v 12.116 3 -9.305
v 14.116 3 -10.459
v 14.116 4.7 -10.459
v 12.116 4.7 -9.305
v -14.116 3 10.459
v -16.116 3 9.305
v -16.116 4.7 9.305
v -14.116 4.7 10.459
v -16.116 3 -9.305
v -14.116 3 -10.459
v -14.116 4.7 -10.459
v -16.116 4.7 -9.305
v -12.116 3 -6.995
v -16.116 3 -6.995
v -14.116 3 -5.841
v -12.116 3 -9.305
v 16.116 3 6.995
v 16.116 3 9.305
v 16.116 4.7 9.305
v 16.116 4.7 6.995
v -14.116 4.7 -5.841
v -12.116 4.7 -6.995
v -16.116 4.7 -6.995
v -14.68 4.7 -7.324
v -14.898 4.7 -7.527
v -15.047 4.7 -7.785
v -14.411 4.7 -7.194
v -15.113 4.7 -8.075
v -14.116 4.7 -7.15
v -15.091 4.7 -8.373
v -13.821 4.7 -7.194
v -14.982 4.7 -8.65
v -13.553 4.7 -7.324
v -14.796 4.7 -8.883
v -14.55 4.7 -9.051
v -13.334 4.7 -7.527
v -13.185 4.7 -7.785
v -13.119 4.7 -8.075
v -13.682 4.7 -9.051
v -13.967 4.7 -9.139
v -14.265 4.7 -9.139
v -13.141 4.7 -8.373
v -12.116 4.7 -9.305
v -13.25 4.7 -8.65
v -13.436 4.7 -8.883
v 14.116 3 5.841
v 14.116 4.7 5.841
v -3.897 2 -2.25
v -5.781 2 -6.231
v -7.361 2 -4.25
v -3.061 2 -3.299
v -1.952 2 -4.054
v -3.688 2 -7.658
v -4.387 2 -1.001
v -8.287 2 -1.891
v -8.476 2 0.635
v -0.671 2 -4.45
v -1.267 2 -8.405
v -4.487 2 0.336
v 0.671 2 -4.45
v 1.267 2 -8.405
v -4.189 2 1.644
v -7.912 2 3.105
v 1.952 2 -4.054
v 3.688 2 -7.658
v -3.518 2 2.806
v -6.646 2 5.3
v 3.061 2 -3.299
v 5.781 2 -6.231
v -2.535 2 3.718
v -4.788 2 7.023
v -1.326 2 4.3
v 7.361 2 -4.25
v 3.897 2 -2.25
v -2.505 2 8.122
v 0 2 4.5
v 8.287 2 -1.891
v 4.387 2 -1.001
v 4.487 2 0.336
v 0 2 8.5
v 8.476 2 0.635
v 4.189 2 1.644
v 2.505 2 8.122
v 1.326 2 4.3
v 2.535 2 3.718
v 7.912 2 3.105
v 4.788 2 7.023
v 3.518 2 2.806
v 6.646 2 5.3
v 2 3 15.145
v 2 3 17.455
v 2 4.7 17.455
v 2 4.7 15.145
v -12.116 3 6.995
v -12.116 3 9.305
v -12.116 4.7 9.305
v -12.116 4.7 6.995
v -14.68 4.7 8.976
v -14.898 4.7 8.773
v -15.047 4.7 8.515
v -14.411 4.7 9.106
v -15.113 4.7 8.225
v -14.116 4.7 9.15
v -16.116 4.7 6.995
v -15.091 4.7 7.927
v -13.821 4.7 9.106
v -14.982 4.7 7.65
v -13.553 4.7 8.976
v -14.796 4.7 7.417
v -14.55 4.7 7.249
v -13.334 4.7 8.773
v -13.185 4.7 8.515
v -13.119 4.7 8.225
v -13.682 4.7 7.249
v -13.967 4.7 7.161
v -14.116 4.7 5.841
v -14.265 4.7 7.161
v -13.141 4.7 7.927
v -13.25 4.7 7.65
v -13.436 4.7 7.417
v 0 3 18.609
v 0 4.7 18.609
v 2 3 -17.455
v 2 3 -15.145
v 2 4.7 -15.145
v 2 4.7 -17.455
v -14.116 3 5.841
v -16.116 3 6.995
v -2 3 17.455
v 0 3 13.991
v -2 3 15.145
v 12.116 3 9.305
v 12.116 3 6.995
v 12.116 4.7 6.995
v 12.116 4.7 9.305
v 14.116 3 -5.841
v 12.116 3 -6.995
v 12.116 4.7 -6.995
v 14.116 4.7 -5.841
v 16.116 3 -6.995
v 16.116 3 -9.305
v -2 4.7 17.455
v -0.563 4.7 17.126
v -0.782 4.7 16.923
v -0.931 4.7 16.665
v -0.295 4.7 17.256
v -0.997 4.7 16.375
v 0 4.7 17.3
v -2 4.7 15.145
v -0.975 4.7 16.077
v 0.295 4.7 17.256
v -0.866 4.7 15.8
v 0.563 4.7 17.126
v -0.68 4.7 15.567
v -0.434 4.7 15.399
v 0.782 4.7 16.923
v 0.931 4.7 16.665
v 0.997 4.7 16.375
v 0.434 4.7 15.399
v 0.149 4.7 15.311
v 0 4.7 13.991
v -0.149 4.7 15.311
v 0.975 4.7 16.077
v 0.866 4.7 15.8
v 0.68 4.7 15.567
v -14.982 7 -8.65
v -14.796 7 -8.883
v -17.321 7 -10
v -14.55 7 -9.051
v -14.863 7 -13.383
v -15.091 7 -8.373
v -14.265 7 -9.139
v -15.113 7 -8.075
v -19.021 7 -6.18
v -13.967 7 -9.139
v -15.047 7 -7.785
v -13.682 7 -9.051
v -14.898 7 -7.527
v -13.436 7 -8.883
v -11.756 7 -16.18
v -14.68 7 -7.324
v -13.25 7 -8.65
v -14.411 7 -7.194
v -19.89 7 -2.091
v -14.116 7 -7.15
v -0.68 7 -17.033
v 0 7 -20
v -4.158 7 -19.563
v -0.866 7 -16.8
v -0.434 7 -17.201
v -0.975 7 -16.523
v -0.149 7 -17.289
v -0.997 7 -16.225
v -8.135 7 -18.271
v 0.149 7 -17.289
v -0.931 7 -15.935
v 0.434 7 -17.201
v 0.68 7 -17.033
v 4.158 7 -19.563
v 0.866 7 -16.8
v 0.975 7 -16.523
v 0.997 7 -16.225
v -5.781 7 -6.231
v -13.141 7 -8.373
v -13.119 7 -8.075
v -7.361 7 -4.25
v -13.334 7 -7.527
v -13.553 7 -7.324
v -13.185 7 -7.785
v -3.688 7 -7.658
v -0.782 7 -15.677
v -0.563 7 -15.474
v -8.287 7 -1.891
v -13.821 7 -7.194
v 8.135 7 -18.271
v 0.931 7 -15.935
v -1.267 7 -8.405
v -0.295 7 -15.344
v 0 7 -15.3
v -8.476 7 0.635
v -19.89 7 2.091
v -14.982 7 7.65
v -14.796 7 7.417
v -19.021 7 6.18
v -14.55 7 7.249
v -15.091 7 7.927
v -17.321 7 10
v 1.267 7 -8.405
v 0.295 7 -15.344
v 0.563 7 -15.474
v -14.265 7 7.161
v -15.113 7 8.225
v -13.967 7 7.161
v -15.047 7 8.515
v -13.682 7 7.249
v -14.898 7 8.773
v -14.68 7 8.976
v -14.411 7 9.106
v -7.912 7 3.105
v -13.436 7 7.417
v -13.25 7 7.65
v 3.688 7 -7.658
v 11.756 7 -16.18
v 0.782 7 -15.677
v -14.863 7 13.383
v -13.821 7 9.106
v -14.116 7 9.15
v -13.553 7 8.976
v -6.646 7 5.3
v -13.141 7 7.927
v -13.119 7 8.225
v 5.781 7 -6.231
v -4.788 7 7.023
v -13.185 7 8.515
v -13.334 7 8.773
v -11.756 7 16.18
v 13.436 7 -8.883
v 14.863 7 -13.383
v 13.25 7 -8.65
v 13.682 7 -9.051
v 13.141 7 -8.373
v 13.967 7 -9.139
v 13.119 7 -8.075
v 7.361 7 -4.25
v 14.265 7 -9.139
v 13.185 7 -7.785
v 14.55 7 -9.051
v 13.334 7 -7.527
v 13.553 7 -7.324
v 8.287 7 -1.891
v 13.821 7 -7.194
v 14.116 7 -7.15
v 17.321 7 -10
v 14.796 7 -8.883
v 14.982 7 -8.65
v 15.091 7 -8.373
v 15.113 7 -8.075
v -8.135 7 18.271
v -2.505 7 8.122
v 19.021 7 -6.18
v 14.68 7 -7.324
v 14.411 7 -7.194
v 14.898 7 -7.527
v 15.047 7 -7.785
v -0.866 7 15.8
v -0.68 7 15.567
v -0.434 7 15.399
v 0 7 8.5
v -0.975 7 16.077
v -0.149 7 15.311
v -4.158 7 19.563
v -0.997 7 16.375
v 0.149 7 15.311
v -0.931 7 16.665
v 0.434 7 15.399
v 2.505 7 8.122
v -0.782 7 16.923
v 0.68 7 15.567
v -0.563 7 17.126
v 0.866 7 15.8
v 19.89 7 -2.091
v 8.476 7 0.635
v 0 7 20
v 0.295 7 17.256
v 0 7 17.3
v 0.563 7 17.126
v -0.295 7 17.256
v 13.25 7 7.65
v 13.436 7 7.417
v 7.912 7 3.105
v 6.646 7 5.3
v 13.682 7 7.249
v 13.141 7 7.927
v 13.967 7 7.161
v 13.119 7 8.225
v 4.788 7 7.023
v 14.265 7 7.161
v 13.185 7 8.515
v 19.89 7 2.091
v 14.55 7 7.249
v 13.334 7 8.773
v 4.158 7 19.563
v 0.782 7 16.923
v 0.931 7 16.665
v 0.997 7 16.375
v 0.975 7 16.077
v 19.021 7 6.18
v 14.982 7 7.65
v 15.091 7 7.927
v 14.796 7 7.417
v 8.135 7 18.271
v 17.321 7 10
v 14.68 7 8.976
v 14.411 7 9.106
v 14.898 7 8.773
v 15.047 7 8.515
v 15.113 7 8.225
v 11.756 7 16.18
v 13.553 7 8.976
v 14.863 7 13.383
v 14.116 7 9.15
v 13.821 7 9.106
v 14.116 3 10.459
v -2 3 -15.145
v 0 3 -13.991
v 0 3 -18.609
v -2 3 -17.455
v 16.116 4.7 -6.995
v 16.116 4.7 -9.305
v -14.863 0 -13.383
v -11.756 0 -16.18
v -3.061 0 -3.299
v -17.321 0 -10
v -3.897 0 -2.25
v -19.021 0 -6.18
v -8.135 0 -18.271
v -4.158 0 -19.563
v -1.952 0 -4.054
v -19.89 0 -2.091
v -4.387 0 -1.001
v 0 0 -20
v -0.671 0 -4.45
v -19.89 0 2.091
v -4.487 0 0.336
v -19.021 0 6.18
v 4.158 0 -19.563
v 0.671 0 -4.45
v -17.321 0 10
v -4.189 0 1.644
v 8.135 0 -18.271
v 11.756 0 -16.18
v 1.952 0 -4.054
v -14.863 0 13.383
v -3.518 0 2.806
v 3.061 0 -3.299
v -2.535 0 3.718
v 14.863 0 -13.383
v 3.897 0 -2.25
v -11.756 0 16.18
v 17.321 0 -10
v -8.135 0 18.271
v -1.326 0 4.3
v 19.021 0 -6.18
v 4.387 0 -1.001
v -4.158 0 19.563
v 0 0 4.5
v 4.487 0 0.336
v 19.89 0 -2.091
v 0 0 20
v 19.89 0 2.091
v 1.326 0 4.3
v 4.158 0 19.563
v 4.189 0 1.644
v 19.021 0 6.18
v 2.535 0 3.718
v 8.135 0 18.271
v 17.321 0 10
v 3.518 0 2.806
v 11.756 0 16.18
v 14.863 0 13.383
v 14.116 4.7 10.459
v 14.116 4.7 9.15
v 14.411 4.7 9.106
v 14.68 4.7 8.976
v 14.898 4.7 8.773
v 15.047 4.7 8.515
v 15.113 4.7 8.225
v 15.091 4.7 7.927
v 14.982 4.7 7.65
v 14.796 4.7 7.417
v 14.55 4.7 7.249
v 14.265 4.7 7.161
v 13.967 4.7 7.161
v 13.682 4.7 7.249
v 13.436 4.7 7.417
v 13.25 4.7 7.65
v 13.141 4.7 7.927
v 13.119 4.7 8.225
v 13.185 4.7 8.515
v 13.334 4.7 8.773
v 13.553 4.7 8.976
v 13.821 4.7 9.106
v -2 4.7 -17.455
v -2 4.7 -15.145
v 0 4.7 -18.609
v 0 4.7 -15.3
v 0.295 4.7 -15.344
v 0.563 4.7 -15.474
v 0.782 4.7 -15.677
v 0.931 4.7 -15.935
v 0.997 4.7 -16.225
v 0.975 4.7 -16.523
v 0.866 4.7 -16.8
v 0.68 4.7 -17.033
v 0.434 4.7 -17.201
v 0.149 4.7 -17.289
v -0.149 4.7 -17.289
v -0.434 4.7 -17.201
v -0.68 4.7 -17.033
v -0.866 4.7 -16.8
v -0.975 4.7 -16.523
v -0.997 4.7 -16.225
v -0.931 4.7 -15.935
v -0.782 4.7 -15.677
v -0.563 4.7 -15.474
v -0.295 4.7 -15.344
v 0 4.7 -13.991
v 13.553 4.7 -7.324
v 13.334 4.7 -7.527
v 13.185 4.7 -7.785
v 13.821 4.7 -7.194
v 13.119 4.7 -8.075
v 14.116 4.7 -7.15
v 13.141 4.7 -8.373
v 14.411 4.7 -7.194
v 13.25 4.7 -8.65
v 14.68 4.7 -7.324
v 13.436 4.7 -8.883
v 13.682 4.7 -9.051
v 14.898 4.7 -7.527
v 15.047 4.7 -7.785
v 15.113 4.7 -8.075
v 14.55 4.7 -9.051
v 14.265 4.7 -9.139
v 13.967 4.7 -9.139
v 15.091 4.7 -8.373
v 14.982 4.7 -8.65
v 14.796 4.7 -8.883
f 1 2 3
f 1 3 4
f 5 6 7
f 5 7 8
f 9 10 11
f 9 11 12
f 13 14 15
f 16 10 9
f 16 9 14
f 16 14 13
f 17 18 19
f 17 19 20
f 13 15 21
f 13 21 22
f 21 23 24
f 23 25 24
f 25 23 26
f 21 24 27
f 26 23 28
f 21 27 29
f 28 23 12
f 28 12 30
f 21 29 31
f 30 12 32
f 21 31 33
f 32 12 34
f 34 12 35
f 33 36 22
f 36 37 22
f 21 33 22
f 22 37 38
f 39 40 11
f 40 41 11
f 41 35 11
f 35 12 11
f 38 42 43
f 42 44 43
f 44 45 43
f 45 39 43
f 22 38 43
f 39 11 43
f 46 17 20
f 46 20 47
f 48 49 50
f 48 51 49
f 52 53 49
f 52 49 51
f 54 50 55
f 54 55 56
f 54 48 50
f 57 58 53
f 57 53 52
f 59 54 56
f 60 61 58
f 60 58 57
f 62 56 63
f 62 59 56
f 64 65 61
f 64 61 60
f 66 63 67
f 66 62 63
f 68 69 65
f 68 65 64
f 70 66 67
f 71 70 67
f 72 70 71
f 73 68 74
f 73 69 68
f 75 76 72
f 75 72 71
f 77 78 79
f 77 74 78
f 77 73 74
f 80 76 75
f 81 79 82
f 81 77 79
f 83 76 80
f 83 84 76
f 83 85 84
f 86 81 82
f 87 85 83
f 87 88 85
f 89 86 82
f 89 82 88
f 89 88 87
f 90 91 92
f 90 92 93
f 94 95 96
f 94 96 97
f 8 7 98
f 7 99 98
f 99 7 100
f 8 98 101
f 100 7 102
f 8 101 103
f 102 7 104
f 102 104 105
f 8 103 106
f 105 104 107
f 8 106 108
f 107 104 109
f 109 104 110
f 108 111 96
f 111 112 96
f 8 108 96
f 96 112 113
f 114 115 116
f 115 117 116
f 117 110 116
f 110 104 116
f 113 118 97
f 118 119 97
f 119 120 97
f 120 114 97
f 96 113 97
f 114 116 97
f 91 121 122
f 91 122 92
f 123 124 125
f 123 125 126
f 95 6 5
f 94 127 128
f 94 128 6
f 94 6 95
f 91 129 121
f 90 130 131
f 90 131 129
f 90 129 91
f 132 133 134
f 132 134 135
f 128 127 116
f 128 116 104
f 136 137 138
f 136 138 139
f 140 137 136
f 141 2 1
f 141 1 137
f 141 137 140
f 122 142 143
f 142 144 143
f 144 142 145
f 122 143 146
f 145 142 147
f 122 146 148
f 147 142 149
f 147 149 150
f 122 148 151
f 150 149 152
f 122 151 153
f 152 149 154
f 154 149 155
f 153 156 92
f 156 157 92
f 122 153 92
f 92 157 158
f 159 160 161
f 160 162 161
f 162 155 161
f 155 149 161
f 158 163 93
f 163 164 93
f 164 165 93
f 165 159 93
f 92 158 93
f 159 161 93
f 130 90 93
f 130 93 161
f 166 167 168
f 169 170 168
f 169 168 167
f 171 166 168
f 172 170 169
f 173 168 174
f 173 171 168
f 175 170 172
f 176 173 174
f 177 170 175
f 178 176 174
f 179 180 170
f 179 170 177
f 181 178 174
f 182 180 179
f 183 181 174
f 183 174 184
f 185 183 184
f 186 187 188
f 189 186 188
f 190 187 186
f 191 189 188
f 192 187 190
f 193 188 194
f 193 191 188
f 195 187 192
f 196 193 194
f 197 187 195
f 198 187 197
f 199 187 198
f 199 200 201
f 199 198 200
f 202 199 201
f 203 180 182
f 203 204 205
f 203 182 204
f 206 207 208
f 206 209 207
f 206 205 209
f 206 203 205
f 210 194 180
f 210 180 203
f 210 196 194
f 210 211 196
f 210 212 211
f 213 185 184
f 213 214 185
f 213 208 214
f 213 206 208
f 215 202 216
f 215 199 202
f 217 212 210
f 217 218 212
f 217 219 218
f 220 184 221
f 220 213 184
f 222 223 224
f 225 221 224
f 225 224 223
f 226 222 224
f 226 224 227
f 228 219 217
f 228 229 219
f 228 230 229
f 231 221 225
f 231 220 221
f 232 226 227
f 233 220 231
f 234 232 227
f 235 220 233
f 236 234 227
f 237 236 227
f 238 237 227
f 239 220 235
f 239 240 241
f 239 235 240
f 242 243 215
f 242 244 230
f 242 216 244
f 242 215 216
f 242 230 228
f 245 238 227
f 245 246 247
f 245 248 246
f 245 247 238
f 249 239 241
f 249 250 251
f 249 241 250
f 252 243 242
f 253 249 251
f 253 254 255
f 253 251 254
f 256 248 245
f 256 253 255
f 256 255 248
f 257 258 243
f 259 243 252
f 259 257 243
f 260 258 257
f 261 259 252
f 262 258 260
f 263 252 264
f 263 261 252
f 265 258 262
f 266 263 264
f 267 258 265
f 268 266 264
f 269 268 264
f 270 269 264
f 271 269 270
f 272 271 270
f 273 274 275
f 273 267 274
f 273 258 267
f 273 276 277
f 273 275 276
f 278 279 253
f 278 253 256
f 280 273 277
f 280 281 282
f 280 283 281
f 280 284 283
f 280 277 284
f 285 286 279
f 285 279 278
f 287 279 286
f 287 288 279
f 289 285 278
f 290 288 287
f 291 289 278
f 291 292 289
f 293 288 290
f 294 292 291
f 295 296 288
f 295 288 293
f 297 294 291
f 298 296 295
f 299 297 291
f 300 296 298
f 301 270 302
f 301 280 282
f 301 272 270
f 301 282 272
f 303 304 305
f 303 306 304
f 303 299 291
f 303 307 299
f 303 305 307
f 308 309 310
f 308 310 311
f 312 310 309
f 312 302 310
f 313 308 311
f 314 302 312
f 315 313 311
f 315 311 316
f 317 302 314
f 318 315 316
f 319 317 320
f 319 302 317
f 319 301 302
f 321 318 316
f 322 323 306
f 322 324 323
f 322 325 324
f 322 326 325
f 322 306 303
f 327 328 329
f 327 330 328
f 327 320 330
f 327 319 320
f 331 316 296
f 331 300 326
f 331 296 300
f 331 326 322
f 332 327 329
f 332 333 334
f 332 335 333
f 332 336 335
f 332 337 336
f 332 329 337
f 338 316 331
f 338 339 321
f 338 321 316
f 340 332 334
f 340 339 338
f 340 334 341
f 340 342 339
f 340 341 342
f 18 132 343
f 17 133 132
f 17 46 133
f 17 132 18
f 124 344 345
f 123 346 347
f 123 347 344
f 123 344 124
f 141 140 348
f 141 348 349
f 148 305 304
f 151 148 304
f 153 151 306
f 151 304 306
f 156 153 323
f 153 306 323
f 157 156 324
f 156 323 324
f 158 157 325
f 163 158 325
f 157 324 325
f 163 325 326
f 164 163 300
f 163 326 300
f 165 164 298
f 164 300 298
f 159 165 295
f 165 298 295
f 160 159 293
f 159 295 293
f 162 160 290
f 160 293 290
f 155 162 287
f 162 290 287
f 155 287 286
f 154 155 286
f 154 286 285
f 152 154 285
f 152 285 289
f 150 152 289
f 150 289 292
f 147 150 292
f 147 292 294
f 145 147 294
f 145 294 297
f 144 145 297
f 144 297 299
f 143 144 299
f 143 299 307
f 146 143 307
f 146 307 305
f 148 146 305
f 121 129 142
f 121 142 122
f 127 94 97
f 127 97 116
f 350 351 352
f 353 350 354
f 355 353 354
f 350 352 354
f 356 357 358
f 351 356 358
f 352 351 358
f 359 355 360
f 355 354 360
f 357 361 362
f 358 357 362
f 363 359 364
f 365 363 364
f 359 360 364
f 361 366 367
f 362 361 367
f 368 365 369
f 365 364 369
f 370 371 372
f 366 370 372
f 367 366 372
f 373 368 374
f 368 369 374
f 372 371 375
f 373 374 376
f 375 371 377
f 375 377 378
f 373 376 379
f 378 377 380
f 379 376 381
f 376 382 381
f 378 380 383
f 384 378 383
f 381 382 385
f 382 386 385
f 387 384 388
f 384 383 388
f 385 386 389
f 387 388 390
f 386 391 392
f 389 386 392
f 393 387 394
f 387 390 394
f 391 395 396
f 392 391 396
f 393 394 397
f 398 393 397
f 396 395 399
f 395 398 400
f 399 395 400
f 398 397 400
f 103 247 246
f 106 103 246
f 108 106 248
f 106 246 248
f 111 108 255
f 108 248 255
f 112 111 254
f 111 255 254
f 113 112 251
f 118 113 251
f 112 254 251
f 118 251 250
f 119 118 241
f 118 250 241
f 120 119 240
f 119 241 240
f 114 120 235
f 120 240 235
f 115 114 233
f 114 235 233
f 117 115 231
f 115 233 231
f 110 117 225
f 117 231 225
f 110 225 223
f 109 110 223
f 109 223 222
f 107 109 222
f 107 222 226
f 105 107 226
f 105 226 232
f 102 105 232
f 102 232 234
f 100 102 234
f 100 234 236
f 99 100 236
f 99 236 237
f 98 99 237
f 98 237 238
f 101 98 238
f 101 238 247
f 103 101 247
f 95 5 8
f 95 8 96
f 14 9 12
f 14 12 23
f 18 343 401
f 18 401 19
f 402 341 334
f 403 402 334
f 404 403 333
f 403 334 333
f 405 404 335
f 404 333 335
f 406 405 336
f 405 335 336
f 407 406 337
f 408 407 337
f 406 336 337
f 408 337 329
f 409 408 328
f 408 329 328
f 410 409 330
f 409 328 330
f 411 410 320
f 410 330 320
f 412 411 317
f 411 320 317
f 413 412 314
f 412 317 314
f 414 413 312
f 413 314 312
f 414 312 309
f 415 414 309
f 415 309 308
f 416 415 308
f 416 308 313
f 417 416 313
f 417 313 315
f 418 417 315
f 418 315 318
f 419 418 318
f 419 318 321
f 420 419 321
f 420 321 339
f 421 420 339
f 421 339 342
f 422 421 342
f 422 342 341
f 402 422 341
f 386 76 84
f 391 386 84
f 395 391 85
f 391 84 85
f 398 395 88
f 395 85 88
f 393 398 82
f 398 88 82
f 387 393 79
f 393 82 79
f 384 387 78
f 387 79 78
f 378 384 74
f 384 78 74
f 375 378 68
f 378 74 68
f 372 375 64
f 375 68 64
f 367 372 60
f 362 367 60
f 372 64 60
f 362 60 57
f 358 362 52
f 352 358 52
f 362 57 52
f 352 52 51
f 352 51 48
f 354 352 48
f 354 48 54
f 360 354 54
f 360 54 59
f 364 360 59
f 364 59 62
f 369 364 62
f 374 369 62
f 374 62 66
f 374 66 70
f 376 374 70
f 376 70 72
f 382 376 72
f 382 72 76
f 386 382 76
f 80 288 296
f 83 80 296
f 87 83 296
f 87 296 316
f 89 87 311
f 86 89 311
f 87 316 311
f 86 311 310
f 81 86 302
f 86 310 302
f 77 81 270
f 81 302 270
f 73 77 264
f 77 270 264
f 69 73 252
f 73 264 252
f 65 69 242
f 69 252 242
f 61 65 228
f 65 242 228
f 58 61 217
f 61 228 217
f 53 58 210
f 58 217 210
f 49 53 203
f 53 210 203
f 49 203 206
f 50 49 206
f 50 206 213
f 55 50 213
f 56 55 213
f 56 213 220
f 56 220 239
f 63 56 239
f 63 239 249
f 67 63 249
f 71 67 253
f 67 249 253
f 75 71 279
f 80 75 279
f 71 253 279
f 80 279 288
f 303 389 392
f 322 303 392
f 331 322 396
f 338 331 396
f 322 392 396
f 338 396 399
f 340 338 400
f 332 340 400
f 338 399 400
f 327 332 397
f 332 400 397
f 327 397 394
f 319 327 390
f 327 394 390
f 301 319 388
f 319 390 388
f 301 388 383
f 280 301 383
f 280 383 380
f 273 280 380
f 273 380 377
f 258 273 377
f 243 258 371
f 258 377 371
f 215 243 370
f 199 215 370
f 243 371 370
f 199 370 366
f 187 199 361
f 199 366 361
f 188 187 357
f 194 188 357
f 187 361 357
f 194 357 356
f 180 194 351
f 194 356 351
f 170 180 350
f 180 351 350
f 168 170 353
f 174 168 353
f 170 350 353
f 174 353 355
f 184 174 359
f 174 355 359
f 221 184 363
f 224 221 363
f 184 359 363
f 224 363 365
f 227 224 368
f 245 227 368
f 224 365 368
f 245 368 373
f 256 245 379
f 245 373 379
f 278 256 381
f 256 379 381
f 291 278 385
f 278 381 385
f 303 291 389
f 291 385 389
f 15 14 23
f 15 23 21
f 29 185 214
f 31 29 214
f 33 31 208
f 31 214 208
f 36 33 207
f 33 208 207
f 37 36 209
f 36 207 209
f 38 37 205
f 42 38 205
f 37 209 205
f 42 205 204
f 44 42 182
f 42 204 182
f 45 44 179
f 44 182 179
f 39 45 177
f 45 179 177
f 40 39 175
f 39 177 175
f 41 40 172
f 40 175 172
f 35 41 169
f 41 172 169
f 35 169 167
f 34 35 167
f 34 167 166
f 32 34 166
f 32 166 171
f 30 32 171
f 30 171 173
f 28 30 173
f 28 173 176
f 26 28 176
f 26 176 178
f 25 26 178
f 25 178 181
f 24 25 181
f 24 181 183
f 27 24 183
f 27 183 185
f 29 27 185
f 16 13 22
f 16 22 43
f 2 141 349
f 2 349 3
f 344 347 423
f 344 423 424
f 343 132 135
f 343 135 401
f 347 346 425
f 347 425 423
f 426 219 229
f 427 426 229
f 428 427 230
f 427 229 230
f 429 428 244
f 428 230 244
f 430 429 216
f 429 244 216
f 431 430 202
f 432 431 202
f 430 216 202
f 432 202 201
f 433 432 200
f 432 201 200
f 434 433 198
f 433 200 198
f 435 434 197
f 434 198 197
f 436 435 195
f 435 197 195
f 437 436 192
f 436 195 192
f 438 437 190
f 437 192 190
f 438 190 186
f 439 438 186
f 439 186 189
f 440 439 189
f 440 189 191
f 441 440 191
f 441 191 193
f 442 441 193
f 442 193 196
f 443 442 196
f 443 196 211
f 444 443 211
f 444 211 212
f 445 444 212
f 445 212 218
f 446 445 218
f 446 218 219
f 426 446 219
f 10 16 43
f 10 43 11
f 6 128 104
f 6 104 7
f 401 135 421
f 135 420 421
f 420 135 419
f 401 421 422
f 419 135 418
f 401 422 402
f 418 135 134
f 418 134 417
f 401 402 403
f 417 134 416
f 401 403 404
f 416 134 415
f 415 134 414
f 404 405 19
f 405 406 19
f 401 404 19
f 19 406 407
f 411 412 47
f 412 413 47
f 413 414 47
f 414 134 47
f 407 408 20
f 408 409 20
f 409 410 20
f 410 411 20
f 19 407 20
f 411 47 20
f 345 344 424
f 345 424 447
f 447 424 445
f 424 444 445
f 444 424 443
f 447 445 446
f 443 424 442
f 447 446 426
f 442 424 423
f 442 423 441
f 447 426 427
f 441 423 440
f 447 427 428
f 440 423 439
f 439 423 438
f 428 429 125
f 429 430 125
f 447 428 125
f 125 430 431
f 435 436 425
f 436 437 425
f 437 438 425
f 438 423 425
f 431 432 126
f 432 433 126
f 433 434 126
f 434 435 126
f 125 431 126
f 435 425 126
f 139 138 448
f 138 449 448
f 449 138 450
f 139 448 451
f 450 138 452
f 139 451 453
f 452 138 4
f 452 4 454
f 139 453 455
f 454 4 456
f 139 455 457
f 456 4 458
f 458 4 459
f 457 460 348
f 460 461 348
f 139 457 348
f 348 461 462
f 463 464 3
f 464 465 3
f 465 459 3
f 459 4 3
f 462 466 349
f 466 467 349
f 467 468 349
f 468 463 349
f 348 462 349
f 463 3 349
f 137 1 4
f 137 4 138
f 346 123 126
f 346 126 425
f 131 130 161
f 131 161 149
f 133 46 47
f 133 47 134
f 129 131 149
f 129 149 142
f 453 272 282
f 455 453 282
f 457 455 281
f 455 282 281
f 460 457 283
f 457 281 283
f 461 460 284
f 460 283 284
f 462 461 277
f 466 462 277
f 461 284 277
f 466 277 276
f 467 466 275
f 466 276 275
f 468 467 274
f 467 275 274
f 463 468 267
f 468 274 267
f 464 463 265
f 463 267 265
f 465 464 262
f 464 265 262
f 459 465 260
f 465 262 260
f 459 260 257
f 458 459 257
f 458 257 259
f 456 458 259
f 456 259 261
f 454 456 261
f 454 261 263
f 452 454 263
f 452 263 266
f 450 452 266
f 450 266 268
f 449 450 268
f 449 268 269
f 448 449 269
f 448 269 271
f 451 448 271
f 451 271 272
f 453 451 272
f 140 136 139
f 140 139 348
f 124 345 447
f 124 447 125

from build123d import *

# Parameters (mm, degrees)
SKETCH1_R           = 20
BOSS_EXTRUDE1_DEPTH = 7
SKETCH2_R           = 8.5
CUT_EXTRUDE1_DEPTH  = 5
SKETCH3_R           = 4.5
CUT_EXTRUDE2_DEPTH  = 30.137604569
SKETCH4_R           = 1
CUT_EXTRUDE3_DEPTH  = 4
CUT_EXTRUDE4_DEPTH  = 1.7


with BuildPart() as part:
    # Sketch1 → Boss-Extrude1 (new body)
    with BuildSketch(Plane(origin=(0, 0, 0), x_dir=(1, 0, 0), z_dir=(0, 1, 0))):
        with Locations(Location((0, 0, 0), (0, 0, 270))):
            Circle(SKETCH1_R)
    extrude(amount=BOSS_EXTRUDE1_DEPTH)

    # Sketch2 → Cut-Extrude1 (cut)
    with BuildSketch(Plane(origin=(0, 7, 0), x_dir=(1, 0, 0), z_dir=(0, 1, 0))):
        with Locations(Location((0, 0, 0), (0, 0, 270))):
            Circle(SKETCH2_R)
    extrude(amount=-CUT_EXTRUDE1_DEPTH, mode=Mode.SUBTRACT)

    # Sketch3 → Cut-Extrude2 (cut, through all)
    with BuildSketch(Plane(origin=(0, 7, 0), x_dir=(1, 0, 0), z_dir=(0, 1, 0))):
        with Locations(Location((0, 0, 0), (0, 0, 270))):
            Circle(SKETCH3_R)
    extrude(amount=-CUT_EXTRUDE2_DEPTH, mode=Mode.SUBTRACT)

    # Sketch4 → Cut-Extrude3 (cut)
    with BuildSketch(Plane(origin=(0, 7, 0), x_dir=(1, 0, 0), z_dir=(0, 1, 0))):
        with Locations(Location((0, 16.3, 0), (0, 0, 270))):
            Circle(SKETCH4_R)
        with Locations(Location((14.116214082, 8.15, 0), (0, 0, 270))):
            Circle(SKETCH4_R)
        with Locations(Location((14.116214082, -8.15, 0), (0, 0, 270))):
            Circle(SKETCH4_R)
        with Locations(Location((0, -16.3, 0), (0, 0, 270))):
            Circle(SKETCH4_R)
        with Locations(Location((-14.116214082, -8.15, 0), (0, 0, 270))):
            Circle(SKETCH4_R)
        with Locations(Location((-14.116214082, 8.15, 0), (0, 0, 270))):
            Circle(SKETCH4_R)
    extrude(amount=-CUT_EXTRUDE3_DEPTH, mode=Mode.SUBTRACT)

    # Sketch5 → Cut-Extrude4 (cut)
    with BuildSketch(Plane(origin=(0, 3, 0), x_dir=(1, 0, 0), z_dir=(0, 1, 0))):
        Polygon((12.116214082, 6.995299462), (14.116214082, 5.840598923), (16.116214082, 6.995299462), (16.116214082, 9.304700538), (14.116214082, 10.459401077), (12.116214082, 9.304700538), align=None)
        Polygon((0, 13.990598923), (2, 15.145299462), (2, 17.454700538), (0, 18.609401077), (-2, 17.454700538), (-2, 15.145299462), align=None)
        Polygon((12.116214082, -6.995299462), (12.116214082, -9.304700538), (14.116214082, -10.459401077), (16.116214082, -9.304700538), (16.116214082, -6.995299462), (14.116214082, -5.840598923), align=None)
        Polygon((0, -13.990598923), (-2, -15.145299462), (-2, -17.454700538), (0, -18.609401077), (2, -17.454700538), (2, -15.145299462), align=None)
        Polygon((-12.116214082, -6.995299462), (-14.116214082, -5.840598923), (-16.116214082, -6.995299462), (-16.116214082, -9.304700538), (-14.116214082, -10.459401077), (-12.116214082, -9.304700538), align=None)
        Polygon((-12.116214082, 6.995299462), (-12.116214082, 9.304700538), (-14.116214082, 10.459401077), (-16.116214082, 9.304700538), (-16.116214082, 6.995299462), (-14.116214082, 5.840598923), align=None)
    extrude(amount=CUT_EXTRUDE4_DEPTH, mode=Mode.SUBTRACT)


solid = part.part
